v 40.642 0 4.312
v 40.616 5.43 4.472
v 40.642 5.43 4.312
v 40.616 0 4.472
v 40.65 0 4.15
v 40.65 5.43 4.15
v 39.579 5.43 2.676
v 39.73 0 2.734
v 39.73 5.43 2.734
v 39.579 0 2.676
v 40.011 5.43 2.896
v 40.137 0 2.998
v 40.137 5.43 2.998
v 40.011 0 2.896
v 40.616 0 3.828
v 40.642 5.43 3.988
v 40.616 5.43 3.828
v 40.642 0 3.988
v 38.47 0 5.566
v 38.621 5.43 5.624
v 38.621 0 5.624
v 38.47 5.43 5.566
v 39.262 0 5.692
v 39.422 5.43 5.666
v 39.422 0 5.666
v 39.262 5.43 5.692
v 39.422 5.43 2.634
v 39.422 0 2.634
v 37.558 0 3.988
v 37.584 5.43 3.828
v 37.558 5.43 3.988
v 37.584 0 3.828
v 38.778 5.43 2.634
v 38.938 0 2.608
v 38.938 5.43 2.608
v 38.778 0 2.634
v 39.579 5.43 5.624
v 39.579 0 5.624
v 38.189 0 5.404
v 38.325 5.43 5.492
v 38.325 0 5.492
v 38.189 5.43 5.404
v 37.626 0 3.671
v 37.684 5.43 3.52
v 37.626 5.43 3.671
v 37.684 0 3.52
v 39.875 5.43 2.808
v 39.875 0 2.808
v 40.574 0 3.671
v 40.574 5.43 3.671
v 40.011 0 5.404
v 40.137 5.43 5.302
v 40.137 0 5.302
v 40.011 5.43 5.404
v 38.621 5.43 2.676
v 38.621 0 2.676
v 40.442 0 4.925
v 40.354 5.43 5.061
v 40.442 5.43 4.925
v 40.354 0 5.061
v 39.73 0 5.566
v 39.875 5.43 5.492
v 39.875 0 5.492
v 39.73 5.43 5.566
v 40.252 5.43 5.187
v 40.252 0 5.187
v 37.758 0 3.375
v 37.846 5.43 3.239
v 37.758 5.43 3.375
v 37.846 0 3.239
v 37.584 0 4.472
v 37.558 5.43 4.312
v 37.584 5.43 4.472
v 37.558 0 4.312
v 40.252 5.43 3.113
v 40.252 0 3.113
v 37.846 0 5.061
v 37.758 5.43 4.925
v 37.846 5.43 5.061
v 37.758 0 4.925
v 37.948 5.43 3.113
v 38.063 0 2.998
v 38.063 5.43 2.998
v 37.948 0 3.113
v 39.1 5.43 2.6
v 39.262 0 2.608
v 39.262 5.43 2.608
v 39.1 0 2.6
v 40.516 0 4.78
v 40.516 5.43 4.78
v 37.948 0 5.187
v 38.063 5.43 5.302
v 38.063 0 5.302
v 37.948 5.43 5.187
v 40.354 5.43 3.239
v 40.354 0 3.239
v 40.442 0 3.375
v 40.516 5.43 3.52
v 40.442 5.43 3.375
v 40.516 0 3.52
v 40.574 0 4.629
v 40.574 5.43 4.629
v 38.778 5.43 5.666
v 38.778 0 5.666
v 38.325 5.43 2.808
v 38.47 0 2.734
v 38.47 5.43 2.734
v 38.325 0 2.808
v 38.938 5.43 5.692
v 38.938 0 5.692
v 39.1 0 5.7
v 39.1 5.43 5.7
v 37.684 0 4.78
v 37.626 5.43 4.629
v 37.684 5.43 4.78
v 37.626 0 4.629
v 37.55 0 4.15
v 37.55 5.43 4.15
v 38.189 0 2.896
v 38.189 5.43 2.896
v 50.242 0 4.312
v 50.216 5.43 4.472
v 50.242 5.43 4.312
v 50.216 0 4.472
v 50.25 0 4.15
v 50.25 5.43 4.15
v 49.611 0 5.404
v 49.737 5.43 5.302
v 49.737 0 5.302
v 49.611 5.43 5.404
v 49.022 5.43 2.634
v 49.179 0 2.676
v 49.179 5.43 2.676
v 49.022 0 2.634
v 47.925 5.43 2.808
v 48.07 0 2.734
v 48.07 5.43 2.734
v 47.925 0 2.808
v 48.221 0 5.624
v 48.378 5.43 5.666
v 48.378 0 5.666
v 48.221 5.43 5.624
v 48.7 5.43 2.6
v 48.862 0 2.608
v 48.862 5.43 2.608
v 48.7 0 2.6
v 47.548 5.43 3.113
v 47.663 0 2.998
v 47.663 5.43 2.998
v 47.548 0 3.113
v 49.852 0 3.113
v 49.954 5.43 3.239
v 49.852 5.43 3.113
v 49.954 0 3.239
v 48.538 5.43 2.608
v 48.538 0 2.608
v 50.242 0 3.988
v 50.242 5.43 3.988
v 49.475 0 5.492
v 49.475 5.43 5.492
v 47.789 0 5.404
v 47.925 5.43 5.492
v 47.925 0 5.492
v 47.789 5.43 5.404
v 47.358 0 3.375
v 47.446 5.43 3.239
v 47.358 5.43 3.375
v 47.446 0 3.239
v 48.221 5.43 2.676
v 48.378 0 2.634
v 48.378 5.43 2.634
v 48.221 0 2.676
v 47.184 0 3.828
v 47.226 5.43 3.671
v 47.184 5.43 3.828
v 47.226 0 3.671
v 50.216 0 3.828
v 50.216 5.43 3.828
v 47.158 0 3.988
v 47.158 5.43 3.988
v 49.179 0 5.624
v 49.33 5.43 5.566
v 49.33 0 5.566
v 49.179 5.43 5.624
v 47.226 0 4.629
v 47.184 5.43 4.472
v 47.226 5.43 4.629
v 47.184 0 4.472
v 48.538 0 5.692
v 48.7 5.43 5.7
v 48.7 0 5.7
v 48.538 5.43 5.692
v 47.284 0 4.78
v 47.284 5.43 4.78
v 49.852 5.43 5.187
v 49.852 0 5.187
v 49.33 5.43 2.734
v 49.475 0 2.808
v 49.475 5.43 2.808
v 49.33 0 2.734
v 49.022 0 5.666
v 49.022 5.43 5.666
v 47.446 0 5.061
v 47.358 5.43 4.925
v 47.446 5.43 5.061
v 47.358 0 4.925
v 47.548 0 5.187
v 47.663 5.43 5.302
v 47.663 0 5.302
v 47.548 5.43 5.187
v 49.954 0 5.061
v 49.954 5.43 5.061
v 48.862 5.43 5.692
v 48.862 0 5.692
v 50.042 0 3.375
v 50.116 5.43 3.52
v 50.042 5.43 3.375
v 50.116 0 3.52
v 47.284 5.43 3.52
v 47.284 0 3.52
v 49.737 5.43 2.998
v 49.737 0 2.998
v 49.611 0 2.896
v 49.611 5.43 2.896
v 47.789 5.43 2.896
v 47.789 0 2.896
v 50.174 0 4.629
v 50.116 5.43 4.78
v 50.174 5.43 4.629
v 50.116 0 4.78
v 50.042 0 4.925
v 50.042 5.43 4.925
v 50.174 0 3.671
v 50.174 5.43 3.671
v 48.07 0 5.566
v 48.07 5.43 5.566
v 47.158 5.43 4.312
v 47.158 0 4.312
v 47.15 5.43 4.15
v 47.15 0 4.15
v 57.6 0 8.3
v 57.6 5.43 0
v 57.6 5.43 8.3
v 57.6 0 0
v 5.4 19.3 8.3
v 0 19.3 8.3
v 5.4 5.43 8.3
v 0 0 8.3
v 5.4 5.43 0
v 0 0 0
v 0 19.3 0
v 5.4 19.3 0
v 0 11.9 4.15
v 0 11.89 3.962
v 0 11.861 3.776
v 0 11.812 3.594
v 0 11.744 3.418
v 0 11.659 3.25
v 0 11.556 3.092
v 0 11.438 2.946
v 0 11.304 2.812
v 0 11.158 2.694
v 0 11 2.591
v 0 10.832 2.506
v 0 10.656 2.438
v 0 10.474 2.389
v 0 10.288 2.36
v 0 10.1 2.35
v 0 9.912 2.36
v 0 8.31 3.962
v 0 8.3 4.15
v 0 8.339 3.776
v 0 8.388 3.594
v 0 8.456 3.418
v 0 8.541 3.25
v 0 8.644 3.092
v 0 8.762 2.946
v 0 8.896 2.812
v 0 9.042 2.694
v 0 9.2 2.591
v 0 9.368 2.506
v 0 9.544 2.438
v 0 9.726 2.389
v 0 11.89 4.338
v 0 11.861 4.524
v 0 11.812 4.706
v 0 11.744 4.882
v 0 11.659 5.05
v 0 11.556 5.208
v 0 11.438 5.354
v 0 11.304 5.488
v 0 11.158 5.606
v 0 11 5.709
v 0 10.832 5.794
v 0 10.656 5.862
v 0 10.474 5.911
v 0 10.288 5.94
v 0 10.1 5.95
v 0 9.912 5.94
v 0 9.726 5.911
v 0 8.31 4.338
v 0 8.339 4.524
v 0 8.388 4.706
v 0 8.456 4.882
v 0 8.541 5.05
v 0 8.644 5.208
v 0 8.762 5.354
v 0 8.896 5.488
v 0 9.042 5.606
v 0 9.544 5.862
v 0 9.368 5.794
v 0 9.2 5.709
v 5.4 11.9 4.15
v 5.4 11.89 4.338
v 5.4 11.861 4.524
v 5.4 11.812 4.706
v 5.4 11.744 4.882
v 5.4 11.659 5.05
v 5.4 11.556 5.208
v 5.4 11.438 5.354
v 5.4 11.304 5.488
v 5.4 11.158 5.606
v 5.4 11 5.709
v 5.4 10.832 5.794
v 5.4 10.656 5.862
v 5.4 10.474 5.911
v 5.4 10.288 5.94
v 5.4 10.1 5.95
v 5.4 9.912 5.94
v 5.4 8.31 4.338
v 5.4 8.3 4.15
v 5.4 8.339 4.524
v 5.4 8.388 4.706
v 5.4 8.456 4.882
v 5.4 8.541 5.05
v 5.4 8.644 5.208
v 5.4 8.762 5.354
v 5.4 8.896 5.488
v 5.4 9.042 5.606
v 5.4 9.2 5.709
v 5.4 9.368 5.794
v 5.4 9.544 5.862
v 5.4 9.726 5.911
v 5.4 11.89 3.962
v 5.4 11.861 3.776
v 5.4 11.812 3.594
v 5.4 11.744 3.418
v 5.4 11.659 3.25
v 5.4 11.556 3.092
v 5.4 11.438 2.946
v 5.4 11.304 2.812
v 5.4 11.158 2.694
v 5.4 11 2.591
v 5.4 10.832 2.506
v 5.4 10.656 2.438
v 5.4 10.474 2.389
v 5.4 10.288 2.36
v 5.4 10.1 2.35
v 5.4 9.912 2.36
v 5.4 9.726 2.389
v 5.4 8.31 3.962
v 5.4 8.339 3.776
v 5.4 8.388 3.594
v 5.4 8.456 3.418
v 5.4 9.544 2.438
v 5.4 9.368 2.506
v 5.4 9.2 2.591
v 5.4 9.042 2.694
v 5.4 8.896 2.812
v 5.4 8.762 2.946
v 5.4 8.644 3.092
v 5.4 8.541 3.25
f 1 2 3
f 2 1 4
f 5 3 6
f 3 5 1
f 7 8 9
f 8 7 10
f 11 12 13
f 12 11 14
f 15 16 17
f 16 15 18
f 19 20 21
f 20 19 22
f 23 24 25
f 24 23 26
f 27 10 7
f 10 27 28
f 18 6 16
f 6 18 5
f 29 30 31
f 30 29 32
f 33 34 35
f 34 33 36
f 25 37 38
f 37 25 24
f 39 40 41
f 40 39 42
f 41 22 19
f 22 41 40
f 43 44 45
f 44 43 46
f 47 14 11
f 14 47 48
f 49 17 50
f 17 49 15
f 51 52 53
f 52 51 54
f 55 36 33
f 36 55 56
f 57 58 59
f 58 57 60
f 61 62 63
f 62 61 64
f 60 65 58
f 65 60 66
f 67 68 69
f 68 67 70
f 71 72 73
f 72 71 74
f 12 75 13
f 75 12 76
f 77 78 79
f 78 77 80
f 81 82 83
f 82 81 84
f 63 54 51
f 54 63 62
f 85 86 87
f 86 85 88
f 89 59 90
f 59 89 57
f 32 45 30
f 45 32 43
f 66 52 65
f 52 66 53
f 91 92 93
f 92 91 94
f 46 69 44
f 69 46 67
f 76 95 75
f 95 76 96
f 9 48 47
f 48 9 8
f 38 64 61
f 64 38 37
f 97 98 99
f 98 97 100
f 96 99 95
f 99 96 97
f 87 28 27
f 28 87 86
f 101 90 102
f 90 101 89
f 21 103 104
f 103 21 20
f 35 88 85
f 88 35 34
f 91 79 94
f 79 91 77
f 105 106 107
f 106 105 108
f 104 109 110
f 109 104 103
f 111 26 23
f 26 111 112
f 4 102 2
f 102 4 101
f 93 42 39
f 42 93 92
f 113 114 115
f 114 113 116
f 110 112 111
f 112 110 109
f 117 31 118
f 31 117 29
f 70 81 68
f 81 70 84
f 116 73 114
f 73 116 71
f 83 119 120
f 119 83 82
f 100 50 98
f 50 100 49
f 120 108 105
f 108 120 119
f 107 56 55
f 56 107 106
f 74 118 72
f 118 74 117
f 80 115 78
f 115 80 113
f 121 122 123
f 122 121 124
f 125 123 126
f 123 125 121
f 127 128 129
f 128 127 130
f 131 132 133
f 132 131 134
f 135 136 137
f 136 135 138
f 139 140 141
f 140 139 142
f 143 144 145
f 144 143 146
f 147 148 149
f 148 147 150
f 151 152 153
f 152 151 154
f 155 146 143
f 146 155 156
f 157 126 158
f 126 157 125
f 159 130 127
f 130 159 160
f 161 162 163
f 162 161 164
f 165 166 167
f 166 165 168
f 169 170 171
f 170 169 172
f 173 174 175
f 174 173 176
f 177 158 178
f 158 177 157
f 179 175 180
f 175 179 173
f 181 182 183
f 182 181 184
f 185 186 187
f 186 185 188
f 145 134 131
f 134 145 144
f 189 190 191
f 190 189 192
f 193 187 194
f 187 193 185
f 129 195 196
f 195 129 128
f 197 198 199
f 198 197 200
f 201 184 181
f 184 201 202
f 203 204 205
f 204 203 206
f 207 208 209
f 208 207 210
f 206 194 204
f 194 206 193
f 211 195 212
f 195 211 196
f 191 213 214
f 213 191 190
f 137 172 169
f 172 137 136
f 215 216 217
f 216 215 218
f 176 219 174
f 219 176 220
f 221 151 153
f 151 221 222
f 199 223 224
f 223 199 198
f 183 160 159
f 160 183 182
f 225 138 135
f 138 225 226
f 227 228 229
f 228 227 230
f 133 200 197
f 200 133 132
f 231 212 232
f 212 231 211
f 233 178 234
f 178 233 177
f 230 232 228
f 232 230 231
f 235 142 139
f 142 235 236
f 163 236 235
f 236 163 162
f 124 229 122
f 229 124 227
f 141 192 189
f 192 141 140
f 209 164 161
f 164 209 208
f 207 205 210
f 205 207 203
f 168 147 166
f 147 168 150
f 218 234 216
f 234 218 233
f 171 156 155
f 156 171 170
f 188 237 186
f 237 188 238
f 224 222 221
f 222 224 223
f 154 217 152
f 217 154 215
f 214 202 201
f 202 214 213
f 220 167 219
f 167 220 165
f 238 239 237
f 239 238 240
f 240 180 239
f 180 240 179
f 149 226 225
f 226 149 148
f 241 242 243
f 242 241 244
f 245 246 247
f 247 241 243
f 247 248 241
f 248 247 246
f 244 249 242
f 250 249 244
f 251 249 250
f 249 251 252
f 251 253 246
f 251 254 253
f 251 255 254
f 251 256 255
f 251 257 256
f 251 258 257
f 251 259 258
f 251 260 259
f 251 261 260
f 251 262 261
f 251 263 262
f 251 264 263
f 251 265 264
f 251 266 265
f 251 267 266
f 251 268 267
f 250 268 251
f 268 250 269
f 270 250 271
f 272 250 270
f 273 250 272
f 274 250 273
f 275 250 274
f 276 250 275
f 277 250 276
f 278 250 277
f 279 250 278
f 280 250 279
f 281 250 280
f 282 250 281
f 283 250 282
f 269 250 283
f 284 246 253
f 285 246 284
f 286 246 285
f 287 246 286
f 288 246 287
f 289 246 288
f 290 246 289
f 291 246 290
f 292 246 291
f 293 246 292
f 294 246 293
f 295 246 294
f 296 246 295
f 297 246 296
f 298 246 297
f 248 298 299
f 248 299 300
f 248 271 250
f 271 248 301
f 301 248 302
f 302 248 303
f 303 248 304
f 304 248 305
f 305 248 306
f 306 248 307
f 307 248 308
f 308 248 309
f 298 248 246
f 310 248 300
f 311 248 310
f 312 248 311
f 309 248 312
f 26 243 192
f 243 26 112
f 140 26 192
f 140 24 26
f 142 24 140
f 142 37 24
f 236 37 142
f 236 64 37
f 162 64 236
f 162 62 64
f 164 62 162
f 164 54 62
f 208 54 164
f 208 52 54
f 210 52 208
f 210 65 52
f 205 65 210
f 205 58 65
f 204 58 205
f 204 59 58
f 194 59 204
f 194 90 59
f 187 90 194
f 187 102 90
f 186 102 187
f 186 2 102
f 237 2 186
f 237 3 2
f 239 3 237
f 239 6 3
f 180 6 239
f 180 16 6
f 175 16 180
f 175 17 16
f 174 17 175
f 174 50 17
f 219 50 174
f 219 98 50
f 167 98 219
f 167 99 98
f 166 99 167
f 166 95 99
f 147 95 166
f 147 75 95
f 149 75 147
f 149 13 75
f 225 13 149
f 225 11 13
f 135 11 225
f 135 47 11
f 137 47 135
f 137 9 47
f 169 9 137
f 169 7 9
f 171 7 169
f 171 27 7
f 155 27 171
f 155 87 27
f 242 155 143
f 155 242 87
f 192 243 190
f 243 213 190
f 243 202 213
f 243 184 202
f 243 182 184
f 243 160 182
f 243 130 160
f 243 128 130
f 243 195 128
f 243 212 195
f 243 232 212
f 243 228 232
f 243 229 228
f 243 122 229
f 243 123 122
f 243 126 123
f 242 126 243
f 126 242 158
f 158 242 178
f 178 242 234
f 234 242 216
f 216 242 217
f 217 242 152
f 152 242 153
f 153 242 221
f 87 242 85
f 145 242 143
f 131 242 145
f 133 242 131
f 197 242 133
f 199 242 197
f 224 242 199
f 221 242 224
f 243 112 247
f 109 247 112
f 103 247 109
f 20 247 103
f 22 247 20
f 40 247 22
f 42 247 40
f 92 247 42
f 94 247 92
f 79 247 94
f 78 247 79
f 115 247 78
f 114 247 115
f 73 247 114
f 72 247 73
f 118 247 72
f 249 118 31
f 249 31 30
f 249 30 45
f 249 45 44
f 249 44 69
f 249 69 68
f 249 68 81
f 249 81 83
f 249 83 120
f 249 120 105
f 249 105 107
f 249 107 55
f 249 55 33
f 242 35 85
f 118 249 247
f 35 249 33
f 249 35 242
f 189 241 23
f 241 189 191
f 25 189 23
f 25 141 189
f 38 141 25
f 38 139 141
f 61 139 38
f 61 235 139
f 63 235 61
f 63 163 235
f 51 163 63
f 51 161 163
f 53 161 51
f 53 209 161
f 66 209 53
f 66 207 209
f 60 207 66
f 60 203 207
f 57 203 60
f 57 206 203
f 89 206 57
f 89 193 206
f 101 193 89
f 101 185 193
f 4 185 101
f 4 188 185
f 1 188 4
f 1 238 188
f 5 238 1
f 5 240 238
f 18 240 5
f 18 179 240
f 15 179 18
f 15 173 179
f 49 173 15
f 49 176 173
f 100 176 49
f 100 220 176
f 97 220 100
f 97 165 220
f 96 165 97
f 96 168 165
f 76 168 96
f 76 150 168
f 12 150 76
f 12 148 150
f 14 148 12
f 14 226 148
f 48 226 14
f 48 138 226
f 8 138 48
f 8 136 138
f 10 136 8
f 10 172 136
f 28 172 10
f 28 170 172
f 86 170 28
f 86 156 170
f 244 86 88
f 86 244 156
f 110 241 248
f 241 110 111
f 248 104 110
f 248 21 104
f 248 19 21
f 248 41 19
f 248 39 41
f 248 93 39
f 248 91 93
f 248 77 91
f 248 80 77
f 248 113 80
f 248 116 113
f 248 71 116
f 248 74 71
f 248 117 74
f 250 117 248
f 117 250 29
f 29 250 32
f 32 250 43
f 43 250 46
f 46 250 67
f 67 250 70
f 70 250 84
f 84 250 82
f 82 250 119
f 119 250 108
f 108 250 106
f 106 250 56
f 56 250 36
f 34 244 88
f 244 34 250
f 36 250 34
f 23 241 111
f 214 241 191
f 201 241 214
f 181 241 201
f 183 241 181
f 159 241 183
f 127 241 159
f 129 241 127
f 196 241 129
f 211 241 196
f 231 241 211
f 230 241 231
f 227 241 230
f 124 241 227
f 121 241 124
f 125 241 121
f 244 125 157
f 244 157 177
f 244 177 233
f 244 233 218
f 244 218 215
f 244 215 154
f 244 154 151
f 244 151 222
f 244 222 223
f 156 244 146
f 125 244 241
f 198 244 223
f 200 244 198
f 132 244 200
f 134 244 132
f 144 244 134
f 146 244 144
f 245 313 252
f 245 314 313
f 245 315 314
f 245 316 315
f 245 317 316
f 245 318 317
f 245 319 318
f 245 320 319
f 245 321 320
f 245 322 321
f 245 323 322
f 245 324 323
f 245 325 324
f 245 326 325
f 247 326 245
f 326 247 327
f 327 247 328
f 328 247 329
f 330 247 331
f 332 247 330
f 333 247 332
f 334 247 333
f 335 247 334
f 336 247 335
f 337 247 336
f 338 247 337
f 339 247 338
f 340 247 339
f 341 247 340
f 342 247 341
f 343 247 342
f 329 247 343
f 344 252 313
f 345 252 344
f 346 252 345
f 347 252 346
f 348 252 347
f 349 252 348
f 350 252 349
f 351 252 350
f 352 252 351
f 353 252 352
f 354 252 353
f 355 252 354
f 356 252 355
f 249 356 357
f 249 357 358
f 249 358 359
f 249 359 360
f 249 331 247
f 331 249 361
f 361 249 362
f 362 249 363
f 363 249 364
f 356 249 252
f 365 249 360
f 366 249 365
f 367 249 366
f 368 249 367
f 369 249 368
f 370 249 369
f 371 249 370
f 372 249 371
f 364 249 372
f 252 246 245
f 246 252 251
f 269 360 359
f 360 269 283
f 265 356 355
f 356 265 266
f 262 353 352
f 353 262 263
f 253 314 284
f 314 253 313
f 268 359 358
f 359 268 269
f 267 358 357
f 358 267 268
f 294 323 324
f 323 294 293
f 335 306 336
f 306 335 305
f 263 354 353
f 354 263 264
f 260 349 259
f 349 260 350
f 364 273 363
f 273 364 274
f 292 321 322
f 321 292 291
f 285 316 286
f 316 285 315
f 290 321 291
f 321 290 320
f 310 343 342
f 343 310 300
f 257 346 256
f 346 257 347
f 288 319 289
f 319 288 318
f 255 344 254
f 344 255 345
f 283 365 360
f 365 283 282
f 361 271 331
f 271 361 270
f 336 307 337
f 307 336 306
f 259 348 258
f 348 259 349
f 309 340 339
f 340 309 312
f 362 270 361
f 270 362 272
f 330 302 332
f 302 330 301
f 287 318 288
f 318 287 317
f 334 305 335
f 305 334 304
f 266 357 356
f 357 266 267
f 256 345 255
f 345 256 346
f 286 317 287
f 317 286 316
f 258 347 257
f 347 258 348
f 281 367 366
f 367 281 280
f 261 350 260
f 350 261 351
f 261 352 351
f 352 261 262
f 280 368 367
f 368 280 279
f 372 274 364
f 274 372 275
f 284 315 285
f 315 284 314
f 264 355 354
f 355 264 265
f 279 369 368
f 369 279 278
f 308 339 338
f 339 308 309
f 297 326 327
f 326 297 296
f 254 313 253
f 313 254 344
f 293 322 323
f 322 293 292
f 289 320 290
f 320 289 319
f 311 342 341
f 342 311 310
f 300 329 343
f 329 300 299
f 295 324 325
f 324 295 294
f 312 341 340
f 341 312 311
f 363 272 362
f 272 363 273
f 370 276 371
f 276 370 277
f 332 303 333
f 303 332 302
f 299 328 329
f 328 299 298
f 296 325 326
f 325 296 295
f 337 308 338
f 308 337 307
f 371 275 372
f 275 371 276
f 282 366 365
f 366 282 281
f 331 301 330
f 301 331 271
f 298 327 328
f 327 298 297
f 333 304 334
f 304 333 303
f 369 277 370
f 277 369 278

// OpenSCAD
// Z Axis End Stop for a Sinhokey Prusa I4

$fn=60;

longLength=57.6;
shortLength=19.3;
height=8.3;
thickeness=5.43;
smallDiameter=3.1;
largeDiameter=3.6;

difference() {
    cube(size=[longLength,thickeness,height]);
      rotate([90,0,0]){
        translate( [39.1, height/2,-6])
            cylinder(r=smallDiameter/2,h=7);
        translate( [48.7,height/2,-6])
            cylinder(r=smallDiameter/2,h=7);
          
        }
}

difference (){
    cube(size=[5.4,shortLength,8.3]);
      rotate([0,90,0]){
        translate( [-height/2, 8.3+largeDiameter/2,-1])
            cylinder(r=largeDiameter/2,h=7);
      }
}
